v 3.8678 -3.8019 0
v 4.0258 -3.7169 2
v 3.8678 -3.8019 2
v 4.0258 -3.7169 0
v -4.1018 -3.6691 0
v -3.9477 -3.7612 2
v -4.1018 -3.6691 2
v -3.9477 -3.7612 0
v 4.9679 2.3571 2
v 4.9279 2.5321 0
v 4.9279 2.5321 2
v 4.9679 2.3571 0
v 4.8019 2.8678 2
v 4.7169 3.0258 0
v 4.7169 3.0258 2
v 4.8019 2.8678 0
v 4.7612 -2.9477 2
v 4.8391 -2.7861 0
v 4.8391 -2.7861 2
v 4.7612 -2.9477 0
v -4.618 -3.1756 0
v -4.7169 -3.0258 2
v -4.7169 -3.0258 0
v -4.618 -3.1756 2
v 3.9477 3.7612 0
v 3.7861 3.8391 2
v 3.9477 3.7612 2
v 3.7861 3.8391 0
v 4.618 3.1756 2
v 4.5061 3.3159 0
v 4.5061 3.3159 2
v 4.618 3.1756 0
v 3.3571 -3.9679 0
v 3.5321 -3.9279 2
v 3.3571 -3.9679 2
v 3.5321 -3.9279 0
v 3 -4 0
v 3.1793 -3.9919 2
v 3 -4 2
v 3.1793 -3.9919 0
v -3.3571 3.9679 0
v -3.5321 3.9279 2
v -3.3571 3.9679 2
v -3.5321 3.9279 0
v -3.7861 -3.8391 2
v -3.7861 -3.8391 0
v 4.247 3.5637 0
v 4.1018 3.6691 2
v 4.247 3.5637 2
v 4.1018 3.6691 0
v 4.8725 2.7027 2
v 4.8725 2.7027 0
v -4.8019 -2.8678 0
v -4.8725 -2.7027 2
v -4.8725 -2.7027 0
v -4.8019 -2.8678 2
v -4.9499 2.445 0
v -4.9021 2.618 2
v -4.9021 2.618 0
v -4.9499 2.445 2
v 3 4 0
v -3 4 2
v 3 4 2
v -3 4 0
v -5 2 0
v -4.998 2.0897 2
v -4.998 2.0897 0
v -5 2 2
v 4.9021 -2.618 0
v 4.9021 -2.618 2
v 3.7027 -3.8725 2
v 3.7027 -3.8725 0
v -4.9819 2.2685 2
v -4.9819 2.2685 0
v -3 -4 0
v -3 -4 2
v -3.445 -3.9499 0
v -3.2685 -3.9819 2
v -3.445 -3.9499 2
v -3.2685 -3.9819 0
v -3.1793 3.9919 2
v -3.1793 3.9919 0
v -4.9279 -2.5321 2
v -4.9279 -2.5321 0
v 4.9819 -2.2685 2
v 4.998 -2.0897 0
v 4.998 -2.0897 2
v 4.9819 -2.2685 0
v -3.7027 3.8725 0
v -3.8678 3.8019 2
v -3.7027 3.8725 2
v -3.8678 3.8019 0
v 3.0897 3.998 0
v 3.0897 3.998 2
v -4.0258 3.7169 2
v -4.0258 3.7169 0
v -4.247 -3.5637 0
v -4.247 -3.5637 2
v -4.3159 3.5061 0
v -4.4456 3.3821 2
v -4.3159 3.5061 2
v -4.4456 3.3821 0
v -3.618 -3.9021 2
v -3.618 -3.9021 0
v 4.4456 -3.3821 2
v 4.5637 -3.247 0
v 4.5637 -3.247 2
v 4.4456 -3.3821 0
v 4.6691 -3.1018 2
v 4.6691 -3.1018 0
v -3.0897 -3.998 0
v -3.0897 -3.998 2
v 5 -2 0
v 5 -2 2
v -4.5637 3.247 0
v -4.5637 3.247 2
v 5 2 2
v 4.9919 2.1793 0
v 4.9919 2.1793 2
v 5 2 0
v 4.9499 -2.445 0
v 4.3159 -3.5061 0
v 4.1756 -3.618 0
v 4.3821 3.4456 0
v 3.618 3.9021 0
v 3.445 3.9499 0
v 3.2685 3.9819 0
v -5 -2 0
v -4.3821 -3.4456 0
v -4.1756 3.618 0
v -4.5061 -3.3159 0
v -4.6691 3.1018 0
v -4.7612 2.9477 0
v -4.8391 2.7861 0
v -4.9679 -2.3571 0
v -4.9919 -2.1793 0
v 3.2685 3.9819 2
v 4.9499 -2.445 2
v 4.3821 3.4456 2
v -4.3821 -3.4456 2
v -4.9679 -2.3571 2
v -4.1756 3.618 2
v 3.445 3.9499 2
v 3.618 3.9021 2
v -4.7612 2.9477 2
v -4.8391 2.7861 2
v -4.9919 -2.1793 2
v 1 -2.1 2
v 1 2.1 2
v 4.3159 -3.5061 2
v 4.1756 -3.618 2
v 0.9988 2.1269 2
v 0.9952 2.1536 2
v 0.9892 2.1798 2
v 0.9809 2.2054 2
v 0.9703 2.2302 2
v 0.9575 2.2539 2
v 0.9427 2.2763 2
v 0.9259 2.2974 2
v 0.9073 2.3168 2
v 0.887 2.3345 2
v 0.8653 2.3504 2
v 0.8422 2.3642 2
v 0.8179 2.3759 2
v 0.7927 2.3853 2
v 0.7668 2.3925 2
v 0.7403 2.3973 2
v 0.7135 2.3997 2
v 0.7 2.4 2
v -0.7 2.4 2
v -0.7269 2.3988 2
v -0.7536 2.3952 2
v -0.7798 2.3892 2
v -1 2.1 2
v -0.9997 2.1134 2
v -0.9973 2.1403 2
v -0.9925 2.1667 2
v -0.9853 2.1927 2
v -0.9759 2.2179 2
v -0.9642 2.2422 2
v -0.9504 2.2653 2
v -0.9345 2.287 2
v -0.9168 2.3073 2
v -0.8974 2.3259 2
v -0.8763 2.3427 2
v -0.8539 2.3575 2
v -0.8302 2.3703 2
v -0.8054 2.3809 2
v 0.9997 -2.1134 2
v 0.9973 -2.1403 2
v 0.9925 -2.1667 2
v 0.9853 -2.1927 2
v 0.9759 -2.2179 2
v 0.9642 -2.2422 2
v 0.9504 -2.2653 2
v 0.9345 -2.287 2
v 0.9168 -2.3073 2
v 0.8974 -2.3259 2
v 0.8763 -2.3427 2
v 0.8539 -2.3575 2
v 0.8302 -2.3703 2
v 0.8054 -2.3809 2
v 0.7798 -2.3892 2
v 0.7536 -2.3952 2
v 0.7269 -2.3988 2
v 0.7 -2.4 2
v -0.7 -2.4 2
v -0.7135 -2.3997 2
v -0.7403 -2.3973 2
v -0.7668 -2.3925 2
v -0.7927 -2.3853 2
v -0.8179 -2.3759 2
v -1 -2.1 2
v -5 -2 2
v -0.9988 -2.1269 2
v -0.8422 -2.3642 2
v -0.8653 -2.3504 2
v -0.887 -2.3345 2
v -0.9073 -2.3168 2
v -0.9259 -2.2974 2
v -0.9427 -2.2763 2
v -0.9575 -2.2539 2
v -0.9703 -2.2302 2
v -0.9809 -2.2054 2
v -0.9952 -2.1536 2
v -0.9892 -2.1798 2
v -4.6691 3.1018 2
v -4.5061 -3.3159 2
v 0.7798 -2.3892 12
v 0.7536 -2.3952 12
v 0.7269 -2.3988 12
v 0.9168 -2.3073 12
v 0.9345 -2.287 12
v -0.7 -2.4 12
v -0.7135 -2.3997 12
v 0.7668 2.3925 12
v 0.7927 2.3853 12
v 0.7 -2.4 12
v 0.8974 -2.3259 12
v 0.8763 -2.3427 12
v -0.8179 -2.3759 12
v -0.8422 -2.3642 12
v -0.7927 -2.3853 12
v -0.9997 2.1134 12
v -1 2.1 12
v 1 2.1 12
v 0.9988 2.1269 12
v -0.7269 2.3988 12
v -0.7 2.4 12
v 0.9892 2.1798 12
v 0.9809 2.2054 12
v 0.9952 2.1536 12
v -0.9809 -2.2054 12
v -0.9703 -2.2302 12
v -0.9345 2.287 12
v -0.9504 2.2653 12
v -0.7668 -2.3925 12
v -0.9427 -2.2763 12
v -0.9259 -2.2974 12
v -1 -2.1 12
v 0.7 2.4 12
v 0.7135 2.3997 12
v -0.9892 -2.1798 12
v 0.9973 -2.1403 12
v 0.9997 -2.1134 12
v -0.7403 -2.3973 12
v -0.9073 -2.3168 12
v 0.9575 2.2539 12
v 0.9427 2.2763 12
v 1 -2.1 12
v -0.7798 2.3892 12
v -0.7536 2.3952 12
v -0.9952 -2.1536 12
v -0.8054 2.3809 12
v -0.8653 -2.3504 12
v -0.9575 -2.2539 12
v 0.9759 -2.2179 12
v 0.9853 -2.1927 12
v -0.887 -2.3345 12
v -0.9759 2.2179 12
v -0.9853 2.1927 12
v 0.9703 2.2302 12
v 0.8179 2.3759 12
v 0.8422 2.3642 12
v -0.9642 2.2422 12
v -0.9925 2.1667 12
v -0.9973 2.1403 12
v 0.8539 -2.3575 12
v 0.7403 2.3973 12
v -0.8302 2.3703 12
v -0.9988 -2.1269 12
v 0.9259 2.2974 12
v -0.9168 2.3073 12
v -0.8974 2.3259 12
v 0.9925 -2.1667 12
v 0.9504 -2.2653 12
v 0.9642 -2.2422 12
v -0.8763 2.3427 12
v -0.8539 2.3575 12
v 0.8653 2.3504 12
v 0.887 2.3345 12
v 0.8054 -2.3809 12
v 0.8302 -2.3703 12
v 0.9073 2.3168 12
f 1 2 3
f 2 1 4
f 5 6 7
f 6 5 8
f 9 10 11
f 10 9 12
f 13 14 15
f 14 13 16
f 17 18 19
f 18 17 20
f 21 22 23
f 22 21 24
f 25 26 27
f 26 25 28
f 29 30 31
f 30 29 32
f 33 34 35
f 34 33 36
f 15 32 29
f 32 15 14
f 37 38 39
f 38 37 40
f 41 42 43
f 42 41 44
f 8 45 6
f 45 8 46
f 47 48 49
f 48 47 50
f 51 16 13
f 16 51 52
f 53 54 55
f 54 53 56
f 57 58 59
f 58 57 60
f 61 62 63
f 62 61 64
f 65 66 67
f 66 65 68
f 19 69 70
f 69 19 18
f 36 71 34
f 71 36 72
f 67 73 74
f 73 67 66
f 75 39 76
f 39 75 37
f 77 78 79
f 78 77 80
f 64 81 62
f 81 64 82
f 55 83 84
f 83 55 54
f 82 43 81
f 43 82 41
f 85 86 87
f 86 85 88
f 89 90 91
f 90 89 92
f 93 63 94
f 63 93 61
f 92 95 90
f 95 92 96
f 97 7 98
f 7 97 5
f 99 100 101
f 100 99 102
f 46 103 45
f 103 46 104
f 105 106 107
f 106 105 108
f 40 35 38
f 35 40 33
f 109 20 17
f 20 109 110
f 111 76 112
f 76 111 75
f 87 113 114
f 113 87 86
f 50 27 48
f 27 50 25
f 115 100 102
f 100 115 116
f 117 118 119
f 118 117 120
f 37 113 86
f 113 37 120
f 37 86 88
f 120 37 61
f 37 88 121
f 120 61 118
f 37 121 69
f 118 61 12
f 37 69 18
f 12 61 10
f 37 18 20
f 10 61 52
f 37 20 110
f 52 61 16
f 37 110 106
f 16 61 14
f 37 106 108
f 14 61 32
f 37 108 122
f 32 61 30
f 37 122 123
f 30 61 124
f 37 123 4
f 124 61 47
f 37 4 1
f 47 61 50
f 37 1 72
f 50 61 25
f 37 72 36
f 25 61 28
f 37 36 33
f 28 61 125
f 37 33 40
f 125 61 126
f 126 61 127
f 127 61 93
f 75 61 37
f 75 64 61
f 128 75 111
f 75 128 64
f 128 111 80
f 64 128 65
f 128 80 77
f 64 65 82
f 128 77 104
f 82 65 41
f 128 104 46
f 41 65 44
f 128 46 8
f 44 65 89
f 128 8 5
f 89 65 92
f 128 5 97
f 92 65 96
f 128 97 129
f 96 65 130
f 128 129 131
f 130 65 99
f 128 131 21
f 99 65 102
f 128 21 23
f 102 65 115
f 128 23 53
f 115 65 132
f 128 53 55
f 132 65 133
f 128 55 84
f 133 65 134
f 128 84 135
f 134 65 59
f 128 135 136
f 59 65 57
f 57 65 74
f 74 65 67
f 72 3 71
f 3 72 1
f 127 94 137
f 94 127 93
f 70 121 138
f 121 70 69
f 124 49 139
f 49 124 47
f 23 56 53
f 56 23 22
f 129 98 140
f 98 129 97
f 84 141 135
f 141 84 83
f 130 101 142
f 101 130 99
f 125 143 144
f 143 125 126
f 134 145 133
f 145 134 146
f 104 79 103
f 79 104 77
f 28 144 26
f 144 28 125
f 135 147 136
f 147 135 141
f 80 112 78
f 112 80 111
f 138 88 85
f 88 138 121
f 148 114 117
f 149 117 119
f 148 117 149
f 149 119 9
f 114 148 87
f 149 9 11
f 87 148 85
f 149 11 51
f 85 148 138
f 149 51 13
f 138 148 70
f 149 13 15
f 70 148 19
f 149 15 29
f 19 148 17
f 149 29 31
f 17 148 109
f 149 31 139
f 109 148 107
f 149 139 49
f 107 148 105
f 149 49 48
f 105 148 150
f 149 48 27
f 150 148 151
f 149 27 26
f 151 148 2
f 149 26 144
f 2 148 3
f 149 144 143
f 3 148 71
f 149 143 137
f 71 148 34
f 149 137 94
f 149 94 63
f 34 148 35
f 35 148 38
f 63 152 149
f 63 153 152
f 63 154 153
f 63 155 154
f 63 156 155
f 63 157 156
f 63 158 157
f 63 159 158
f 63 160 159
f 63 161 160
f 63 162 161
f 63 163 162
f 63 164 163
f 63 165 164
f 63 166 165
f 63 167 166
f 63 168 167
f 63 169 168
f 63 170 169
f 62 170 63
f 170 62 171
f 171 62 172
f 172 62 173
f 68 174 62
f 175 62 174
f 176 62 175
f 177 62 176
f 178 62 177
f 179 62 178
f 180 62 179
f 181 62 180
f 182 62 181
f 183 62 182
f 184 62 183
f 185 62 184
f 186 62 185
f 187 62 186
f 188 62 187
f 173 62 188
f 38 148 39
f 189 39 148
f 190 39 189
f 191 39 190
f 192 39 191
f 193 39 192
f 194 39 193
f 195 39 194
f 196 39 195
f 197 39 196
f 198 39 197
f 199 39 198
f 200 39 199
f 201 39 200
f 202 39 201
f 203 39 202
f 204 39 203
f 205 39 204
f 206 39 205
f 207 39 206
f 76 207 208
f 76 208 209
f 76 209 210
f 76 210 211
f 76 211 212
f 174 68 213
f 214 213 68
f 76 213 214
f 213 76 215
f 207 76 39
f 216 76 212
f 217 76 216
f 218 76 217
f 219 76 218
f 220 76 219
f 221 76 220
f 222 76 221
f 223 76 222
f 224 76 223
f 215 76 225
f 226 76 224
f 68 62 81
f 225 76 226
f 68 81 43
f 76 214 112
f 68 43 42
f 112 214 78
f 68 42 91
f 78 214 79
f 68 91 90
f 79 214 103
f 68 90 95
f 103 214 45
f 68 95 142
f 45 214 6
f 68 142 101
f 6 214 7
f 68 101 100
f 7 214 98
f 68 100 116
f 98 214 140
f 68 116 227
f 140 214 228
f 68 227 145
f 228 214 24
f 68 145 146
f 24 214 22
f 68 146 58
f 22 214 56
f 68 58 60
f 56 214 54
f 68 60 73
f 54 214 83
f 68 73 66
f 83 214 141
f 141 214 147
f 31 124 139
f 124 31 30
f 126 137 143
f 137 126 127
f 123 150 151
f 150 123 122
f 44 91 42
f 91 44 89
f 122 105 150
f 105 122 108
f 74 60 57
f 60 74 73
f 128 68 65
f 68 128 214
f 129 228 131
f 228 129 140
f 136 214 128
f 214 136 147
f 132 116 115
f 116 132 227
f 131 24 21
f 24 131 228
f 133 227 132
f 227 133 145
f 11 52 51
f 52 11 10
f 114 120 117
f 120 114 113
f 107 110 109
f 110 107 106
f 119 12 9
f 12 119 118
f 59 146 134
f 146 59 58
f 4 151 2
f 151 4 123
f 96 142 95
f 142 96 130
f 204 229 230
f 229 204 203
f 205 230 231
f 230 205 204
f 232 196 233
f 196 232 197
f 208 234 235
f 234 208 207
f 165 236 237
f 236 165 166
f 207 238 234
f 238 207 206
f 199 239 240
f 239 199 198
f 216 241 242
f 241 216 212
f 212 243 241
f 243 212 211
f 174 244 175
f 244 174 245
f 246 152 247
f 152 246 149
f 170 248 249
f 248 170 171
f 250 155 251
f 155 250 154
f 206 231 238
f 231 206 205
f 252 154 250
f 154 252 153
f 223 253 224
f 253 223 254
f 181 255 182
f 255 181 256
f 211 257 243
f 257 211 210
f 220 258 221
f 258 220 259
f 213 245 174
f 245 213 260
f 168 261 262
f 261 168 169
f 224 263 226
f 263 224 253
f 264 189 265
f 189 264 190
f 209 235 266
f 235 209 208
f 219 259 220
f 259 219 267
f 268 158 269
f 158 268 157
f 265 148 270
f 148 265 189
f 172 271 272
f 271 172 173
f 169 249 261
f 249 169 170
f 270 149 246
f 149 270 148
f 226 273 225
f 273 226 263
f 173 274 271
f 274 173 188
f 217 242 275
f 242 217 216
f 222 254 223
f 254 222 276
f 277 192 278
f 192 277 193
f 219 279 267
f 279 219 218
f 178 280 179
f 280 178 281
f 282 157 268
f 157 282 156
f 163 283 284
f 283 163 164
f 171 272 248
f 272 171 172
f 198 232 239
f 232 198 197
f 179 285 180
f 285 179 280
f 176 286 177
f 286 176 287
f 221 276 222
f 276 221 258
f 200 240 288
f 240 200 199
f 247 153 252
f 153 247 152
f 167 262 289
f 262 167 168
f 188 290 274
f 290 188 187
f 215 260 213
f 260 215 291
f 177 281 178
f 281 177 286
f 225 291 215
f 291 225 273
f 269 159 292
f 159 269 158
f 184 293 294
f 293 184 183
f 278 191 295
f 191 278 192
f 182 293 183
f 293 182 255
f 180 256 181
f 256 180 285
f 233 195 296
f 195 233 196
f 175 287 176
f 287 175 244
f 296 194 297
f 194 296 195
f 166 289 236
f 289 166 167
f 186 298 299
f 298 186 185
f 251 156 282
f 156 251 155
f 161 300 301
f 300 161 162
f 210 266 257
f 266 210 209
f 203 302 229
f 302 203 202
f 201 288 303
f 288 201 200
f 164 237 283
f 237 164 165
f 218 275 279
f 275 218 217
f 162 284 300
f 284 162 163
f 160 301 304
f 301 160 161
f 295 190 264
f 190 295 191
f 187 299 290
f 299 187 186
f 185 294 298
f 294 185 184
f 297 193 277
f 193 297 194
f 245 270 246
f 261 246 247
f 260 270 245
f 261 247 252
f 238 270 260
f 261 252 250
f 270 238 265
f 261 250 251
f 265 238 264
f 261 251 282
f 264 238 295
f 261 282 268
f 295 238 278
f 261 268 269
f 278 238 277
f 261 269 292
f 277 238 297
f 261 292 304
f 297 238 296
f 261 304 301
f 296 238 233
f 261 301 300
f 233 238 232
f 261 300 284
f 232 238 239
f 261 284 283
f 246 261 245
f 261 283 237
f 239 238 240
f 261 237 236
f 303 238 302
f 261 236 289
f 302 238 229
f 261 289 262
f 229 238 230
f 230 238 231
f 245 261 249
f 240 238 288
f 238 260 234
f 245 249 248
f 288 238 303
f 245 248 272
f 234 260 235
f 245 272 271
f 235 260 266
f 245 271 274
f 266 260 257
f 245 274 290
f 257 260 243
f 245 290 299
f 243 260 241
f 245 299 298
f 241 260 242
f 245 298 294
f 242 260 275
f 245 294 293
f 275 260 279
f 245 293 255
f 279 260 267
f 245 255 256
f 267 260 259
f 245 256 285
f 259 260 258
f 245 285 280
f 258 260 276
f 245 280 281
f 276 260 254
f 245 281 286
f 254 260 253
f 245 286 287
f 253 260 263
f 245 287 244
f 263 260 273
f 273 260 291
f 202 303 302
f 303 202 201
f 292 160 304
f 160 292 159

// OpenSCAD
$fn = 70;

module rounded(r)
{
    offset(r = r) offset(r = -r) children(0);
}

// Base
linear_extrude(height = 2) rounded(2) square(size = [ 10, 8 ], center = true);

// Stick
linear_extrude(height = 12) rounded(0.3) square(size = [ 2, 4.8 ], center = true);
